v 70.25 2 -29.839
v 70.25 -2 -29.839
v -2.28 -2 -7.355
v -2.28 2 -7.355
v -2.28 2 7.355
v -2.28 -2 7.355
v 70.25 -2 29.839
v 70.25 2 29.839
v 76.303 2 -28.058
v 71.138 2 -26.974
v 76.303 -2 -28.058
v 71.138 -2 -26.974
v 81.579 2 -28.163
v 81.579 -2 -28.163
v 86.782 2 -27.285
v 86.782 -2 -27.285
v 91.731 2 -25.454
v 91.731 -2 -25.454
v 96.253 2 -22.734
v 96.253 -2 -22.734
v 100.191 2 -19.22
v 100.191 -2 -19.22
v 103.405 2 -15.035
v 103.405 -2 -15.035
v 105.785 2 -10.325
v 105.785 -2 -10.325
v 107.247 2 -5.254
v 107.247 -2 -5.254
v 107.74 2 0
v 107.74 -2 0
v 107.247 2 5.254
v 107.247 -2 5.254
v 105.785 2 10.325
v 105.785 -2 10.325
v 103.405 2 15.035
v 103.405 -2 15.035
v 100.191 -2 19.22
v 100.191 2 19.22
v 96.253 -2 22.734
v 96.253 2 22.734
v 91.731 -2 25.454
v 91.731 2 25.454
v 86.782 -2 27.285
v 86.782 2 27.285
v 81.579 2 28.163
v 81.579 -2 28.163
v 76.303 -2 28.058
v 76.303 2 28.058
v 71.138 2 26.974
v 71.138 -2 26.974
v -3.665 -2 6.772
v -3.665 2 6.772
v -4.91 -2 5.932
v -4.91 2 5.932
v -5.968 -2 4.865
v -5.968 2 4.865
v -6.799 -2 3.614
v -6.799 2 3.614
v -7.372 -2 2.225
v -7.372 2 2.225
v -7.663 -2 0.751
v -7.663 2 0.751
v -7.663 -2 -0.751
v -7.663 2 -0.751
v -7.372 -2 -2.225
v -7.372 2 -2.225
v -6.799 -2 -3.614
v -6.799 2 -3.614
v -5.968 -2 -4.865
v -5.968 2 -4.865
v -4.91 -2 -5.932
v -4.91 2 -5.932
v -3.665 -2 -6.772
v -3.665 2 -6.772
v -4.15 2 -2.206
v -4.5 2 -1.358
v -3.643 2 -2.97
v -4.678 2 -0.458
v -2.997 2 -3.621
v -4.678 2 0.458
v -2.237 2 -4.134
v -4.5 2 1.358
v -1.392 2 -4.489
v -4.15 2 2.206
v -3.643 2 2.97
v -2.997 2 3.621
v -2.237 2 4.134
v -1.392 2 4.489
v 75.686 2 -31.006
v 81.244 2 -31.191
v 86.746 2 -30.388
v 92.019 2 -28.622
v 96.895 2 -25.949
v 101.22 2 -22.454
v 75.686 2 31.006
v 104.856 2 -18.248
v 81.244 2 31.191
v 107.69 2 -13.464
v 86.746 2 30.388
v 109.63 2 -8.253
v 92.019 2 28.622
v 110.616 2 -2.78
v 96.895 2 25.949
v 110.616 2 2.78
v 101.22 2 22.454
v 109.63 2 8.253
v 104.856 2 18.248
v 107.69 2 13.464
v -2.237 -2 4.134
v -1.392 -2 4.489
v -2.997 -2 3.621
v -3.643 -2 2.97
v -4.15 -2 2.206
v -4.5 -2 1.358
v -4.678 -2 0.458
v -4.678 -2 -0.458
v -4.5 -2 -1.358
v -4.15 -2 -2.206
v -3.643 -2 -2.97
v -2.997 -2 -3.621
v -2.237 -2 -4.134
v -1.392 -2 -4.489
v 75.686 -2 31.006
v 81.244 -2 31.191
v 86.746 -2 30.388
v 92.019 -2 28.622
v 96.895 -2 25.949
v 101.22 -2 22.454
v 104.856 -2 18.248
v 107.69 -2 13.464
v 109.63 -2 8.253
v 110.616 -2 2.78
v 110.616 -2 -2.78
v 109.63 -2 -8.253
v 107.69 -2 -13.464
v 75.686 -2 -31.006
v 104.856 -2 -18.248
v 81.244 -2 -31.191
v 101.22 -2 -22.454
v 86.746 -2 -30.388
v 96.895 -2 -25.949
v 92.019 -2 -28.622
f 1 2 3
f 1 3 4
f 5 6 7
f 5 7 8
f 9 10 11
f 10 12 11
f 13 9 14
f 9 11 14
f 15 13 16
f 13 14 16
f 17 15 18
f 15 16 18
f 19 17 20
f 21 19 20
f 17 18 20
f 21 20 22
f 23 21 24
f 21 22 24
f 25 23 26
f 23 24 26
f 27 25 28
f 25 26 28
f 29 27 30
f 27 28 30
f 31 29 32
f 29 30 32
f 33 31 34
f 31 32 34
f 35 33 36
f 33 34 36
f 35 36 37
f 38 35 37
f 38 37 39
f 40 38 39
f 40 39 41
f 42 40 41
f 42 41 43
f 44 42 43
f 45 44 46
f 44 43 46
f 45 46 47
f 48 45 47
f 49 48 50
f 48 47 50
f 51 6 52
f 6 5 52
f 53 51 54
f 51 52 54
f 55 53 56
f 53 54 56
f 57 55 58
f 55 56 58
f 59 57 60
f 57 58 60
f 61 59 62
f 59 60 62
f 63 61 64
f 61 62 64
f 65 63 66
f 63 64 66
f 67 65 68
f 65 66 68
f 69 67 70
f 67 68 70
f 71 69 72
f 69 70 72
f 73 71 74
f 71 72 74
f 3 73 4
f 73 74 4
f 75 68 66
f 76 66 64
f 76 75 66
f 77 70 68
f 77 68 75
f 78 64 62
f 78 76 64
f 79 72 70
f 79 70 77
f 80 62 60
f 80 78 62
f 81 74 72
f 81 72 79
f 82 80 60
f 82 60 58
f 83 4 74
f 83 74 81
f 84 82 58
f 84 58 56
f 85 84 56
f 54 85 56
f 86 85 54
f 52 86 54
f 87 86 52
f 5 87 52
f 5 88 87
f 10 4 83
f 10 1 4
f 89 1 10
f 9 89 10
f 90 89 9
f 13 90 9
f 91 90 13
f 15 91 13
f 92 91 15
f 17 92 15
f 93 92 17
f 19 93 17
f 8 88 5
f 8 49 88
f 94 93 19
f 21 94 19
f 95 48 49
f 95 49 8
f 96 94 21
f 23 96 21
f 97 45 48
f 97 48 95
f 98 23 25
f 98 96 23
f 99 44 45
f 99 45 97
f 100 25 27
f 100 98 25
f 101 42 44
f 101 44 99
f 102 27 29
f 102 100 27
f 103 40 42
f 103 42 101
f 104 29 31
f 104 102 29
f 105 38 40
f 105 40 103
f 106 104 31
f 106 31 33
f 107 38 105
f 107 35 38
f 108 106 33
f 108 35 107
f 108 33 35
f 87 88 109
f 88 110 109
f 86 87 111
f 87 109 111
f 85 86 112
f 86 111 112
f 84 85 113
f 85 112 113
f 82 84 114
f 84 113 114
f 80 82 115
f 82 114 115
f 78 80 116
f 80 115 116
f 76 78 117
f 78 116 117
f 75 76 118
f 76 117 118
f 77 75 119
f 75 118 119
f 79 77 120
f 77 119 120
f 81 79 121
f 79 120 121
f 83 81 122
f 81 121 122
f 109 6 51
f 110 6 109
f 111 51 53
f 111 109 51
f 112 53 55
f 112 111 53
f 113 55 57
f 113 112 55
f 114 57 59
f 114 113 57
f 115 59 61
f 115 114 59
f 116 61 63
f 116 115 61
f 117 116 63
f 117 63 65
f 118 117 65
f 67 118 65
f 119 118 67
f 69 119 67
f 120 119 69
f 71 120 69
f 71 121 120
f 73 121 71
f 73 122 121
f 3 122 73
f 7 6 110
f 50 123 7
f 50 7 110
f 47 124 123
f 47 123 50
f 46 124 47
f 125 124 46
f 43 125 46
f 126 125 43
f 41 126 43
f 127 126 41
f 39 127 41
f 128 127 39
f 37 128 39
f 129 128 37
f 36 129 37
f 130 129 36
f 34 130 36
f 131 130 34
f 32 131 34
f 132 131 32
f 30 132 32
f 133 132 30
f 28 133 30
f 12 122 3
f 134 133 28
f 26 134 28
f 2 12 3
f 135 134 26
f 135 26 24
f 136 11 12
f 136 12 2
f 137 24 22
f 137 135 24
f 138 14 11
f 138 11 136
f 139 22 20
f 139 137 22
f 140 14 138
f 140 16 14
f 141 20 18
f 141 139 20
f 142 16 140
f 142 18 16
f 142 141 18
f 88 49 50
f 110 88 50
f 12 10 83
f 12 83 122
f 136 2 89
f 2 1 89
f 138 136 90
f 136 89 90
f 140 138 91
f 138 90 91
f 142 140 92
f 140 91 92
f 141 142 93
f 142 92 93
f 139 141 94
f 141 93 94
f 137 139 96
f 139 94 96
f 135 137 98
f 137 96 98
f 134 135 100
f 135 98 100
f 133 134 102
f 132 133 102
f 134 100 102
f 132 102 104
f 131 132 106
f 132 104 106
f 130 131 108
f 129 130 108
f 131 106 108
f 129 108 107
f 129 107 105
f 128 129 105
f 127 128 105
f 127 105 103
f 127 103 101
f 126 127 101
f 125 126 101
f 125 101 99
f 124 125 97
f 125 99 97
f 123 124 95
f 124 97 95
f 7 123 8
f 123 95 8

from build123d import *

# Parameters (mm, degrees)
SKETCH2_W = 3
SKETCH2_H = 4


with BuildPart() as part:
    # Sweep1: sweep along a path in Sketch1
    with BuildLine(Plane(origin=(0, 0, 0), x_dir=(1, 0, 0), z_dir=(0, 1, 0))) as sweep1_path:
        Line((-1.391672956, 4.489236726), (71.138118239, 26.973626627))
        ThreePointArc((71.138118239, 26.973626627), (107.74, 0), (71.138118239, -26.973626627))
        Line((71.138118239, -26.973626627), (-1.391672956, -4.489236726))
        ThreePointArc((-1.391672956, -4.489236726), (-4.7, 0), (-1.391672956, 4.489236726))
    # Sketch2 → Sweep1 (sweep)
    with BuildSketch(Plane(origin=(79.5, 0, 0), x_dir=(0, 0, -1), z_dir=(1, 0, 0))):
        with Locations((29.74, 0)):
            Rectangle(SKETCH2_W, SKETCH2_H)
    sweep(path=sweep1_path.line)


solid = part.part
